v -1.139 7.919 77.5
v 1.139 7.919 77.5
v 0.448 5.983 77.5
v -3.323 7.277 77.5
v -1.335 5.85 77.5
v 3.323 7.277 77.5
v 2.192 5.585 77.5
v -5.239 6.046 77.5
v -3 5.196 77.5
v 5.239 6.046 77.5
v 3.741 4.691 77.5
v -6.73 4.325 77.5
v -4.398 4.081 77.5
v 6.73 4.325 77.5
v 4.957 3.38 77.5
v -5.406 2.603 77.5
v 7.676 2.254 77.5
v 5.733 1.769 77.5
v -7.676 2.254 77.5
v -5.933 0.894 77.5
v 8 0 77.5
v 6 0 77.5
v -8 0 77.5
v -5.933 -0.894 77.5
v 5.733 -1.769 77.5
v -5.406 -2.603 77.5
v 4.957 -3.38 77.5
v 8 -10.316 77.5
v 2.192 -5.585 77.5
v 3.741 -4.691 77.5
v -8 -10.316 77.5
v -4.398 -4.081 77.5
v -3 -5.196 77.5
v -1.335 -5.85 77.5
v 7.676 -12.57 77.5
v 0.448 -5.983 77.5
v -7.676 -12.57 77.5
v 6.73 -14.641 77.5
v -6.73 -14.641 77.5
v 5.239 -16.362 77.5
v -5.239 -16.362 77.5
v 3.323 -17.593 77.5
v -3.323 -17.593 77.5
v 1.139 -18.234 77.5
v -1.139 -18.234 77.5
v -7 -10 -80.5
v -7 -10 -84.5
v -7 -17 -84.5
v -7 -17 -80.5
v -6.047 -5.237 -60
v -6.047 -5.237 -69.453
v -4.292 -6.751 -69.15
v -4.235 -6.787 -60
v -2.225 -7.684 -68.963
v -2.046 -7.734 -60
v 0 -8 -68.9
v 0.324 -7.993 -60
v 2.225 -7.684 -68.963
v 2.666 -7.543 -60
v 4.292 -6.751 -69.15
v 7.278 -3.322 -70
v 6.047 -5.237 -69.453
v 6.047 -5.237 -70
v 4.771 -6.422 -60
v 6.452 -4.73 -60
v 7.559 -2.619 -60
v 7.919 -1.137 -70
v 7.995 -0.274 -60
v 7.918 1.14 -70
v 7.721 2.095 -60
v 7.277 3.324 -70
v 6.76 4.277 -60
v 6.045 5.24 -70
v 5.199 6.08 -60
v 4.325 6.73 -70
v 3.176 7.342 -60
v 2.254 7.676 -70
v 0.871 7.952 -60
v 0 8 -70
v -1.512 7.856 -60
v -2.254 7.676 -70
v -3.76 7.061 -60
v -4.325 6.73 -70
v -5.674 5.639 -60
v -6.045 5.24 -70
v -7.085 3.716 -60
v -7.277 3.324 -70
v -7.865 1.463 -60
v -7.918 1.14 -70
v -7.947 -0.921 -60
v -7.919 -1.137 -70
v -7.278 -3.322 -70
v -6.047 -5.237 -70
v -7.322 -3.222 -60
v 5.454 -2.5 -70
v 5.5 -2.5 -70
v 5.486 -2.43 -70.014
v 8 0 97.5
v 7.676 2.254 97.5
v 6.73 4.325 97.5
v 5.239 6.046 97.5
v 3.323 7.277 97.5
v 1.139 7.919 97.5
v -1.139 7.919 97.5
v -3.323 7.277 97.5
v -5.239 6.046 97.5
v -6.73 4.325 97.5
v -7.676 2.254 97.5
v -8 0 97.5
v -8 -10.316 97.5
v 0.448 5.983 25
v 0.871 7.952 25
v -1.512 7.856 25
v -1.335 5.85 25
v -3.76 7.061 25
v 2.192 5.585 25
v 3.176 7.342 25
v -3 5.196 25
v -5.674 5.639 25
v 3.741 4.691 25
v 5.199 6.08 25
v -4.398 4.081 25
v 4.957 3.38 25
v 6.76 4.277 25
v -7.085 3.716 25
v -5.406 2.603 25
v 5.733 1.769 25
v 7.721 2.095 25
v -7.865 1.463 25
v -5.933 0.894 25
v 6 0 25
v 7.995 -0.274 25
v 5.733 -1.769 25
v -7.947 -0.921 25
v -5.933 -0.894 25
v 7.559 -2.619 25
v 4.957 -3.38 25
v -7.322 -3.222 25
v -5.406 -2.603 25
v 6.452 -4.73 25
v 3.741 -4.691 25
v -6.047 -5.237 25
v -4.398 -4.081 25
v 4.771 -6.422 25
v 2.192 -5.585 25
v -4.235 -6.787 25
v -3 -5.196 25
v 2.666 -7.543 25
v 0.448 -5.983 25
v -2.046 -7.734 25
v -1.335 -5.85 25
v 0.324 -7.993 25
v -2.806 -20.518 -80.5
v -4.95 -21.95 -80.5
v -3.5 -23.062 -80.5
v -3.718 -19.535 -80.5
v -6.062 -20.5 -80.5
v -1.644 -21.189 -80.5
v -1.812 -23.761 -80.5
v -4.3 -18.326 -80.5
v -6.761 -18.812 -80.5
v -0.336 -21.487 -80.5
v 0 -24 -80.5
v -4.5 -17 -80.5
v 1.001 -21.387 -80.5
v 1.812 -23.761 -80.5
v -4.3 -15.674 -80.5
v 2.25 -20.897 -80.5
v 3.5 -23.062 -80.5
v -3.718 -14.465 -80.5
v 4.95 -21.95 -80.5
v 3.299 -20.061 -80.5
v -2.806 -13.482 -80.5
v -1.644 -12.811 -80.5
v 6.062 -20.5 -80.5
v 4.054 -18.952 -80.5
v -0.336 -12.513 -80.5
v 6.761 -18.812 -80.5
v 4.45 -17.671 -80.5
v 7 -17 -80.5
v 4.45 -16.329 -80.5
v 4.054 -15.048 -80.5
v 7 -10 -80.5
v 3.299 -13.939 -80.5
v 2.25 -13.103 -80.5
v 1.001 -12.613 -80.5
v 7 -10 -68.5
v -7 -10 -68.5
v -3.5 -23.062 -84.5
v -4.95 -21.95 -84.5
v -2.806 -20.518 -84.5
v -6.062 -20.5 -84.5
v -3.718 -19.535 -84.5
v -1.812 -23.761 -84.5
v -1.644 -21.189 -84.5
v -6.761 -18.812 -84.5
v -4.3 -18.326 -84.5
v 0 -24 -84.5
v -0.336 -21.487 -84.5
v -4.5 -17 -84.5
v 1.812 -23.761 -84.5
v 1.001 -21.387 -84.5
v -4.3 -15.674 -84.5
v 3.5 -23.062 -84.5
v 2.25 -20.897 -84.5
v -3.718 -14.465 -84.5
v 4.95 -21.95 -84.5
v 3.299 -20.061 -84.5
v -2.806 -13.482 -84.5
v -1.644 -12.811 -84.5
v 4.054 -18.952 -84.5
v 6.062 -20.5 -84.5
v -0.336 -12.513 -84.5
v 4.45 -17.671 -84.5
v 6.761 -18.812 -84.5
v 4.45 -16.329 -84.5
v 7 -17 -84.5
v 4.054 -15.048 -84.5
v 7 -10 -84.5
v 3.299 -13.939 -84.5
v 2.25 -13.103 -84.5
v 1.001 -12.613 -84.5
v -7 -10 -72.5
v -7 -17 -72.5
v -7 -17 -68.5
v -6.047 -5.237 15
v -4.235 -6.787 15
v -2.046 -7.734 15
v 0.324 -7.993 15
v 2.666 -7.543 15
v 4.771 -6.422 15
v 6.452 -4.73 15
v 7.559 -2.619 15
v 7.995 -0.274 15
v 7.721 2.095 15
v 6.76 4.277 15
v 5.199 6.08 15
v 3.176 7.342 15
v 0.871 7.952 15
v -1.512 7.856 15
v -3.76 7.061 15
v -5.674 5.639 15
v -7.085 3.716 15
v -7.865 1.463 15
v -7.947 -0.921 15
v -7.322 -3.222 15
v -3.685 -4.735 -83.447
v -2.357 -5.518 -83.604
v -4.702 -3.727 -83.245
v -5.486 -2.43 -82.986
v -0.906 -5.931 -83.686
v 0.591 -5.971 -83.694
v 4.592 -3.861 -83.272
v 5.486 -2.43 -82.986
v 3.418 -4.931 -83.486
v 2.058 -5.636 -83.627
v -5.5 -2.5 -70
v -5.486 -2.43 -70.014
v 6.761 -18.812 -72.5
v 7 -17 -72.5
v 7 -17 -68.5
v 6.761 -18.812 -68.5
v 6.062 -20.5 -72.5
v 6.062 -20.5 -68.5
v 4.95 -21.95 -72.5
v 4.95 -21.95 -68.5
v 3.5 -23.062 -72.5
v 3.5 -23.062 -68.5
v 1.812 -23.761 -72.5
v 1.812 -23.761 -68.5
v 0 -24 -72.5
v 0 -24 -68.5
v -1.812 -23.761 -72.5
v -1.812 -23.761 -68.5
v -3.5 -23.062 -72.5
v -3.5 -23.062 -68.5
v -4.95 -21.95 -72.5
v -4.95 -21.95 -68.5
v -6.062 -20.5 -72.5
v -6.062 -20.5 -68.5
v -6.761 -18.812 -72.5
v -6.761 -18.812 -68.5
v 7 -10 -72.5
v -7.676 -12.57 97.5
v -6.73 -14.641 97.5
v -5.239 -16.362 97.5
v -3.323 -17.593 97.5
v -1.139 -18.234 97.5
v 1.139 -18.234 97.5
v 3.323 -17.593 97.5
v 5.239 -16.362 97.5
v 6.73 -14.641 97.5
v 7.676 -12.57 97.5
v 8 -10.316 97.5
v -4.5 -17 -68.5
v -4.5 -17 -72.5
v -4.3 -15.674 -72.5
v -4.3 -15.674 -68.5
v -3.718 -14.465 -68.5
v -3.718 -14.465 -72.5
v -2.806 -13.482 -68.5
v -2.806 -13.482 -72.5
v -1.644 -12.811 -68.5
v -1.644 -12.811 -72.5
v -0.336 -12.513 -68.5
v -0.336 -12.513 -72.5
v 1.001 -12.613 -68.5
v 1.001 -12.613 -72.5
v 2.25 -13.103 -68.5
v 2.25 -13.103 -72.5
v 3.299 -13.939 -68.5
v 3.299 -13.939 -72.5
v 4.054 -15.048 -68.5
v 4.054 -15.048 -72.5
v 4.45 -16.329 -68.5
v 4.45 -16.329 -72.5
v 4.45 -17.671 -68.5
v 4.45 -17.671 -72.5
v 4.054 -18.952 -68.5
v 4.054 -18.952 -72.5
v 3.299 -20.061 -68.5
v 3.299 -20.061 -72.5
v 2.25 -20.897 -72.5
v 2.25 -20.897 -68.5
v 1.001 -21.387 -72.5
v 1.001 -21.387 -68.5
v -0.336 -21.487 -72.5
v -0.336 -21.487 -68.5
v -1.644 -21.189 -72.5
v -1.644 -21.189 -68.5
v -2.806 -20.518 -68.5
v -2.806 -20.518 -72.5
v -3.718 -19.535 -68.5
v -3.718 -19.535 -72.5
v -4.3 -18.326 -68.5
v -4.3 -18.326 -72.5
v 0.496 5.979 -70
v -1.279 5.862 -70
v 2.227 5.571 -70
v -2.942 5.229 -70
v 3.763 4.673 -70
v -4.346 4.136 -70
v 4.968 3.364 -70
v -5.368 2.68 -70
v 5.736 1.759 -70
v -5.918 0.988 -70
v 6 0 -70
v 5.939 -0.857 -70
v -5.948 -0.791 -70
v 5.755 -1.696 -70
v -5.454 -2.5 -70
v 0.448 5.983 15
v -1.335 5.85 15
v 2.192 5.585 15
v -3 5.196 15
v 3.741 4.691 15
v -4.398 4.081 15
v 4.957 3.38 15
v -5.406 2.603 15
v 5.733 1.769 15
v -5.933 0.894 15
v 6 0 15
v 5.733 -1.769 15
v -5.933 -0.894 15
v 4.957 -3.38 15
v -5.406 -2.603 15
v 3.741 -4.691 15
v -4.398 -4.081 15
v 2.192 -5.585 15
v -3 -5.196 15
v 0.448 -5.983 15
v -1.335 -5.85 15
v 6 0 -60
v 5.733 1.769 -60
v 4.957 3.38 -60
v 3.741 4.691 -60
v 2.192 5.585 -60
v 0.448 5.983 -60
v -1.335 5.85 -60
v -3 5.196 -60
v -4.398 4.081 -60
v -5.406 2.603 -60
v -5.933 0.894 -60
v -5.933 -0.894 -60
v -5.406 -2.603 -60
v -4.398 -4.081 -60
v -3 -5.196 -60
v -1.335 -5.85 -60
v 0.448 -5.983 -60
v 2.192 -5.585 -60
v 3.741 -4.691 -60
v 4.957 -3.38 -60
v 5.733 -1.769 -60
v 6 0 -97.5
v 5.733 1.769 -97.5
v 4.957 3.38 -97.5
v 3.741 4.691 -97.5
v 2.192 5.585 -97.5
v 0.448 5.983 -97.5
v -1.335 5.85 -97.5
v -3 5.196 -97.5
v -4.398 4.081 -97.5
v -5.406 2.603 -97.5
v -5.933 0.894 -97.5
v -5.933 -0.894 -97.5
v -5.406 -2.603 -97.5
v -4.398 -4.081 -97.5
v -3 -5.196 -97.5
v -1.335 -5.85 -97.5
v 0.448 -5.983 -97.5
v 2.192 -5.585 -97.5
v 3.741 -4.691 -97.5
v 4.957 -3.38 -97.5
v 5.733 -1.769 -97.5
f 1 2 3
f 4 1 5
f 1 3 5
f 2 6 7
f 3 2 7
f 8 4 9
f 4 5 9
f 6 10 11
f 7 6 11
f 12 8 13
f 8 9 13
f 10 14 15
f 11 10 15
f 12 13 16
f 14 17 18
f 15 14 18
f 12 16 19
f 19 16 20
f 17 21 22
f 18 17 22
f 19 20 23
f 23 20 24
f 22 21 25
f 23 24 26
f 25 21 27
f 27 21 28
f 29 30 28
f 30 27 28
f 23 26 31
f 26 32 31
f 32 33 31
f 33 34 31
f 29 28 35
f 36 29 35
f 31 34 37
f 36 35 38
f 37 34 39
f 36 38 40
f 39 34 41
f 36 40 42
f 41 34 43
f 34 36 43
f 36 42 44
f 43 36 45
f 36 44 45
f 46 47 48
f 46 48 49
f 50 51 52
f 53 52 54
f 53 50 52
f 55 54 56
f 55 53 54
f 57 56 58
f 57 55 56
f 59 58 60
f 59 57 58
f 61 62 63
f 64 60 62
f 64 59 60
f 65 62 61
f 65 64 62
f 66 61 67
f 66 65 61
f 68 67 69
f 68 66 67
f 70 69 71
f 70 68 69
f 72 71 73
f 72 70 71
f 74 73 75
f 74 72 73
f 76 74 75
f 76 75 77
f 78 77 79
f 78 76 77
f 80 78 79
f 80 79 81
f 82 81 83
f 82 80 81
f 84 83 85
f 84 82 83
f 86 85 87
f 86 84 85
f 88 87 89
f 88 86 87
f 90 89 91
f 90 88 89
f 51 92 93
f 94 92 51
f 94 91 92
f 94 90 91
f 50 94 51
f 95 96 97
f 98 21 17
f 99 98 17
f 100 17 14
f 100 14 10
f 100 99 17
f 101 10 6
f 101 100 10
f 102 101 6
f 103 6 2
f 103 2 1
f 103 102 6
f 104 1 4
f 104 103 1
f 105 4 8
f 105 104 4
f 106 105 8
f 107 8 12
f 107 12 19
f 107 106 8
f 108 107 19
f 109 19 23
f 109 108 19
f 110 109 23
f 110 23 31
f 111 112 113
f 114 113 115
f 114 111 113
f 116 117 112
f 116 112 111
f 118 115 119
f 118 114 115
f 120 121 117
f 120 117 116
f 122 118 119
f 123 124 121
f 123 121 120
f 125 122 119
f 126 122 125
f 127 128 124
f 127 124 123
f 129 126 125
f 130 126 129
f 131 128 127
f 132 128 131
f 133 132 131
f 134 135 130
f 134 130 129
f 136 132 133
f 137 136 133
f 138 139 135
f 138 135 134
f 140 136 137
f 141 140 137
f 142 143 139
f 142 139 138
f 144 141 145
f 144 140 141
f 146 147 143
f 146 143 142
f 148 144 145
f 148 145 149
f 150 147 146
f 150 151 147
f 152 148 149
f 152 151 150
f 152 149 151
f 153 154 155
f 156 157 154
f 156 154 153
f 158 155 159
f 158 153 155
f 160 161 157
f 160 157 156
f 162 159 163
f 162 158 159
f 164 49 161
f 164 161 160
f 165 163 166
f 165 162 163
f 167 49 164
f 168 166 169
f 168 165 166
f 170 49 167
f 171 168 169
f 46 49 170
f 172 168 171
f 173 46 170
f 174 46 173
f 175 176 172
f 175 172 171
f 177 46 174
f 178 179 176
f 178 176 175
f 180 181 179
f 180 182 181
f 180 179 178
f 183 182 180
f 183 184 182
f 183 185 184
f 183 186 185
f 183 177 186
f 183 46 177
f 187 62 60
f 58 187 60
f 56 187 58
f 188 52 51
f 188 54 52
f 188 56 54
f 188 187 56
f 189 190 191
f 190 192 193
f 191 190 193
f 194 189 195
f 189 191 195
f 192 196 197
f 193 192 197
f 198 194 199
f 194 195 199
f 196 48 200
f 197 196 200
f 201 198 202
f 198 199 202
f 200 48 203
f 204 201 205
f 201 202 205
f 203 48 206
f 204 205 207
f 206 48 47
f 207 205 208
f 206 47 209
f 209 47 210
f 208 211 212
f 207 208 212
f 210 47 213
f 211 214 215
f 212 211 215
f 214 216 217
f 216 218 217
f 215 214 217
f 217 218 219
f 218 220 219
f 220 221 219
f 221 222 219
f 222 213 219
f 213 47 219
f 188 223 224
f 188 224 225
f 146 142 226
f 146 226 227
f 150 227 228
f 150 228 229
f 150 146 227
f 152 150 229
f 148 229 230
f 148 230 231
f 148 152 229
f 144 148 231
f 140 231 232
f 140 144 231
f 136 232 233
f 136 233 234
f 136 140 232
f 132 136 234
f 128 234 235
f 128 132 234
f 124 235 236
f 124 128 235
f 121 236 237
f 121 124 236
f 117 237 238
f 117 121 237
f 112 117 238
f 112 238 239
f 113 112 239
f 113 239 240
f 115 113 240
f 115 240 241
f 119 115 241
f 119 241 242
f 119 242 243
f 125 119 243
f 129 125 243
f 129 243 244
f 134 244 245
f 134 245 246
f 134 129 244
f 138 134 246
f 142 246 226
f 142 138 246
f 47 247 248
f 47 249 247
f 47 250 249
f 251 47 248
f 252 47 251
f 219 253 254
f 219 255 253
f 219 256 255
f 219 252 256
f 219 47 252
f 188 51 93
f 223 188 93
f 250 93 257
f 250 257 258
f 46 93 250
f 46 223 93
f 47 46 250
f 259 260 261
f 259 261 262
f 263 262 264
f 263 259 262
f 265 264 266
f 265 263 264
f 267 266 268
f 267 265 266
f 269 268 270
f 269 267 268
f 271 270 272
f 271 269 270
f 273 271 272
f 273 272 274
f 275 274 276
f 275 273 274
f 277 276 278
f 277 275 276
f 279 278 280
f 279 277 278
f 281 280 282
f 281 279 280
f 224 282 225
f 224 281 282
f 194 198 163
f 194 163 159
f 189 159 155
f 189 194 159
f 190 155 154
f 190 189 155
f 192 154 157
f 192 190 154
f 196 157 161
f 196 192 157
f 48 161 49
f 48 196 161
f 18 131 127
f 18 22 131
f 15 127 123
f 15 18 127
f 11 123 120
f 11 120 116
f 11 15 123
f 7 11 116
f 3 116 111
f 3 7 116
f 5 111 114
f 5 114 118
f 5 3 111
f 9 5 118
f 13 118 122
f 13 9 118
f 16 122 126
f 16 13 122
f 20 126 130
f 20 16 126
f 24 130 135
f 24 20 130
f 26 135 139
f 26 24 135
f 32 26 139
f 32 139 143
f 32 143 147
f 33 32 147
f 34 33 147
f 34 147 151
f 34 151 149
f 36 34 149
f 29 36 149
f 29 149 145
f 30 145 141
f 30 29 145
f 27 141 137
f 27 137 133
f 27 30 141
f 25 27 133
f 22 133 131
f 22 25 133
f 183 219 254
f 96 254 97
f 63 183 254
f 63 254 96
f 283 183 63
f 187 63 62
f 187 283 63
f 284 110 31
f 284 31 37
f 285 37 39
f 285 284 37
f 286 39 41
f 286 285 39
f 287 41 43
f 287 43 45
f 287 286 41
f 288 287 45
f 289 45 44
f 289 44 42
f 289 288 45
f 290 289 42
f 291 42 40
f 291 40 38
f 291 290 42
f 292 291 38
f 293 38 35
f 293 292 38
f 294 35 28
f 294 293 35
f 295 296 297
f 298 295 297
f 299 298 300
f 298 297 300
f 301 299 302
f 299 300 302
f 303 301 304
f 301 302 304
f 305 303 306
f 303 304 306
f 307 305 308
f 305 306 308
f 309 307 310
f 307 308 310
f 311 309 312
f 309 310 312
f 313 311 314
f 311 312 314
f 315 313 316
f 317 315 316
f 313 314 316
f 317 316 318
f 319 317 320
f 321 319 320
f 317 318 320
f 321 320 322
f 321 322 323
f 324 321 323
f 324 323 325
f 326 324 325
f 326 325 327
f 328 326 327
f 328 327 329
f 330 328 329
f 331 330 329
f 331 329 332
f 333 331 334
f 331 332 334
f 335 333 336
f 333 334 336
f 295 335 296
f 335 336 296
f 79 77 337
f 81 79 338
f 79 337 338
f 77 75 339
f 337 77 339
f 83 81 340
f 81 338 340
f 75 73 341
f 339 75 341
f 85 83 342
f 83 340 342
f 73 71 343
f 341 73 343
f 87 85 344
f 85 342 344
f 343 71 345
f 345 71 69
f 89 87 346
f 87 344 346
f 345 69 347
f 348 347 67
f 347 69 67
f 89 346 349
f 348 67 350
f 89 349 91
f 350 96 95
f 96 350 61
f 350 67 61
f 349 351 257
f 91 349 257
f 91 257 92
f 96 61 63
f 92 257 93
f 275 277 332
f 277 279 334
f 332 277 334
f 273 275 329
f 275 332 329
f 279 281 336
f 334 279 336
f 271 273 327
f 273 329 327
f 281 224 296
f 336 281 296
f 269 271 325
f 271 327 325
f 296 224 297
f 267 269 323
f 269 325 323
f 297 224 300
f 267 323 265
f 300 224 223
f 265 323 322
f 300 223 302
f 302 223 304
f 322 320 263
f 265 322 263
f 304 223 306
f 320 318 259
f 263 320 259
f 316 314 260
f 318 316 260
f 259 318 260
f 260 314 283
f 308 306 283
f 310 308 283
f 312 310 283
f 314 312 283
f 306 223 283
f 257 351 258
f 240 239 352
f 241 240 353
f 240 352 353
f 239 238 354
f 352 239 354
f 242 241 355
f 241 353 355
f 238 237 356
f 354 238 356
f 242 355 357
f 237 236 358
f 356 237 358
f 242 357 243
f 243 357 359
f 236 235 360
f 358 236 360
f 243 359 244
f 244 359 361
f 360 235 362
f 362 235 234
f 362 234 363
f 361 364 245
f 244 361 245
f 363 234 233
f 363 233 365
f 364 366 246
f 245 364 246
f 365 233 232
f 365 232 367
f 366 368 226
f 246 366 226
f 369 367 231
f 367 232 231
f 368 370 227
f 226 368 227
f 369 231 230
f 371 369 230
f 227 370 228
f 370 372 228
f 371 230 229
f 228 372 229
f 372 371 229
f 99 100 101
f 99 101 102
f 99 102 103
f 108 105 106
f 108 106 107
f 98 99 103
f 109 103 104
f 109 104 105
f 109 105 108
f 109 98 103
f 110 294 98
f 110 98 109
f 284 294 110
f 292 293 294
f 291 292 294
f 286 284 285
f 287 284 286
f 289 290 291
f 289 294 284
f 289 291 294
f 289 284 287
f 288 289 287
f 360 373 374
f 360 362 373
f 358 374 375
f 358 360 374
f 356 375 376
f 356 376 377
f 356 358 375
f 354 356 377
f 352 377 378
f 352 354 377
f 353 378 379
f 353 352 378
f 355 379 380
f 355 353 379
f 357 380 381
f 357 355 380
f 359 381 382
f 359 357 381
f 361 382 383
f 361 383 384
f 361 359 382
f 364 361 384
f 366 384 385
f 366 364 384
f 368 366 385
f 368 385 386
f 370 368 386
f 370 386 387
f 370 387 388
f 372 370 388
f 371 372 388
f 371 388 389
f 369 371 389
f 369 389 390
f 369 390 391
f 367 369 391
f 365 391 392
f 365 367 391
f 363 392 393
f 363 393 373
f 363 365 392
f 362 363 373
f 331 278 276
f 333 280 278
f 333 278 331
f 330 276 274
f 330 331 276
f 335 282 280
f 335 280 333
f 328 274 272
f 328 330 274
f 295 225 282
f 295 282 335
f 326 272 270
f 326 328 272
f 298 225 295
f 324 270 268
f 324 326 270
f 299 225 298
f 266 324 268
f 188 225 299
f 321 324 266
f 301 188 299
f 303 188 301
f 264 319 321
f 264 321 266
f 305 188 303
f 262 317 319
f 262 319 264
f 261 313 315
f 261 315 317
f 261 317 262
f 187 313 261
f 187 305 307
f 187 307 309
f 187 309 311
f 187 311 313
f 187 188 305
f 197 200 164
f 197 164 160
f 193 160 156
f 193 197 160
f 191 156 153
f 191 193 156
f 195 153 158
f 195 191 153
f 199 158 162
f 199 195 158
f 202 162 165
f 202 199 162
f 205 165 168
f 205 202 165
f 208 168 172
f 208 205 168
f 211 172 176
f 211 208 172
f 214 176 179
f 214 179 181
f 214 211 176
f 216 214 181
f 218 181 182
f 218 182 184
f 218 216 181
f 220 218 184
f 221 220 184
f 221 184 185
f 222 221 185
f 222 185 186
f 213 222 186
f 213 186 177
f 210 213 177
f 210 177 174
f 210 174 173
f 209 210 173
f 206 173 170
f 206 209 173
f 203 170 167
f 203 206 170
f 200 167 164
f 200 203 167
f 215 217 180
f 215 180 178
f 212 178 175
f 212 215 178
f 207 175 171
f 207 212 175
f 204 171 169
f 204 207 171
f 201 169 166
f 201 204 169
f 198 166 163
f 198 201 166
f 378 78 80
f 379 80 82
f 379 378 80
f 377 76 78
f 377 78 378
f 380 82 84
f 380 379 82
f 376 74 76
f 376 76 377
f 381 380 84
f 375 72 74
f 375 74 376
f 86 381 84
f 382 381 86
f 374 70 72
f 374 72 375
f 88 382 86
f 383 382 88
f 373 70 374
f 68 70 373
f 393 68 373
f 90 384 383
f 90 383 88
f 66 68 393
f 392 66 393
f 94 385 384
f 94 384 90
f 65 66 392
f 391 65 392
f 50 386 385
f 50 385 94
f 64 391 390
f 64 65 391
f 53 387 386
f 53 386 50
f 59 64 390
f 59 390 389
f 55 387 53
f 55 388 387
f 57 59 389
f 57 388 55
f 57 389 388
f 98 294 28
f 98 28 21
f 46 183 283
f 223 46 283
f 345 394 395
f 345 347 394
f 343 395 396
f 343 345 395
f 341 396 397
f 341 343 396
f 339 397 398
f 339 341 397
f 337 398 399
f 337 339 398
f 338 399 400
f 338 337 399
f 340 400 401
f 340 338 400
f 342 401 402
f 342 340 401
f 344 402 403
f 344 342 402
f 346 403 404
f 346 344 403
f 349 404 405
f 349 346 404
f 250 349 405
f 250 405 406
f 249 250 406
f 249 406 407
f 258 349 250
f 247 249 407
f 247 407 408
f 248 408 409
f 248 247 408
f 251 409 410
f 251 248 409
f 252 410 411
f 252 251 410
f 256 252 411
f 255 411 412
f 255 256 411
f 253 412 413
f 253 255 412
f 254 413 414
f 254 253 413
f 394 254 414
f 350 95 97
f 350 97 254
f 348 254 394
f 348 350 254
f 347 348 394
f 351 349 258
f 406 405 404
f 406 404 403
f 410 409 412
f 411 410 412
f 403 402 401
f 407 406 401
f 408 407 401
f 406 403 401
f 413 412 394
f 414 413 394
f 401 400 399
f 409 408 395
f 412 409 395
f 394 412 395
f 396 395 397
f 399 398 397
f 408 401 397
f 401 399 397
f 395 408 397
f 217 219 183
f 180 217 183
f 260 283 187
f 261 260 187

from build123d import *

# Parameters (mm, degrees)
SKETCH1_R           = 6
BOSS_EXTRUDE1_DEPTH = 97.5
SKETCH4_W           = 14
SKETCH4_H           = 4
BOSS_EXTRUDE2_DEPTH = 14
SKETCH5_R           = 4.5
CUT_EXTRUDE1_DEPTH  = 4
CUT_EXTRUDE2_START  = -4
SKETCH6_R           = 4.5
CUT_EXTRUDE2_DEPTH  = 4
CUT_EXTRUDE3_DEPTH  = 168.871975132
SKETCH8_R           = 8
BOSS_EXTRUDE3_DEPTH = 5
SKETCH9_R           = 6
BOSS_EXTRUDE4_DEPTH = 20
BOSS_EXTRUDE5_START = 10
SKETCH11_R          = 8
BOSS_EXTRUDE5_DEPTH = 10


with BuildPart() as part:
    # Sketch1 → Boss-Extrude1 (new, symmetric)
    with BuildSketch(Plane.XY):
        Circle(SKETCH1_R)
    extrude(amount=BOSS_EXTRUDE1_DEPTH, both=True)

    # Sketch2 → Loft1 section 0
    with BuildSketch(Plane(origin=(0, 0, 0), x_dir=(1, 0, 0), z_dir=(0, 1, 0))):
        with BuildLine():
            Line((-5, 82.5), (5, 82.5))
            Line((5, 82.5), (5, 70.5))
            Line((5, 70.5), (-5, 70.5))
            Line((-5, 70.5), (-5, 82.5))
        make_face()
    # Sketch3 → Loft1 section 1
    with BuildSketch(Plane(origin=(0, -10, 0), x_dir=(-1, 0, 0), z_dir=(0, 1, 0))):
        with BuildLine():
            Line((-7, -68.5), (7, -68.5))
            Line((7, -68.5), (7, -84.5))
            Line((7, -84.5), (-7, -84.5))
            Line((-7, -84.5), (-7, -68.5))
        make_face()
    loft()

    # Sketch4 → Boss-Extrude2 (add)
    with BuildSketch(Plane.XZ.offset(10)):
        with Locations((0, -70.5)):
            Rectangle(SKETCH4_W, SKETCH4_H)
        with Locations((0, -82.5)):
            Rectangle(SKETCH4_W, SKETCH4_H)
    extrude(amount=BOSS_EXTRUDE2_DEPTH)

    # Sketch5 → Cut-Extrude1 (cut)
    with BuildSketch(Plane(origin=(0, 0, -72.5), x_dir=(-1, 0, 0), z_dir=(0, 0, -1))):
        with Locations((0, -17)):
            Circle(SKETCH5_R)
    extrude(amount=-CUT_EXTRUDE1_DEPTH, mode=Mode.SUBTRACT)

    # Sketch6 → Cut-Extrude2 (cut)
    with BuildSketch(Plane.XY.offset(-80.5).offset(CUT_EXTRUDE2_START)):
        with Locations((0, -17)):
            Circle(SKETCH6_R)
    extrude(amount=CUT_EXTRUDE2_DEPTH, mode=Mode.SUBTRACT)

    # Sketch7 → Cut-Extrude3 (cut, through all)
    with BuildSketch(Plane.XY.offset(-68.5)):
        with BuildLine():
            ThreePointArc((0, -24), (-4.949747468, -21.949747468), (-7, -17))
            Line((-7, -17), (-7, -24))
            Line((-7, -24), (0, -24))
        make_face()
        with BuildLine():
            ThreePointArc((7, -17), (4.949747468, -21.949747468), (0, -24))
            Line((0, -24), (7, -24))
            Line((7, -24), (7, -17))
        make_face()
    extrude(amount=-CUT_EXTRUDE3_DEPTH, mode=Mode.SUBTRACT)

    # Sketch8 → Boss-Extrude3 (add, symmetric)
    with BuildSketch(Plane.XY.offset(-65)):
        Circle(SKETCH8_R)
    extrude(amount=BOSS_EXTRUDE3_DEPTH, both=True)

    # Sketch9 → Boss-Extrude4 (add)
    with BuildSketch(Plane.XY.offset(97.5)):
        with BuildLine():
            Line((8, -10.315788333), (8, 0))
            ThreePointArc((8, 0), (0, 8), (-8, 0))
            Line((-8, 0), (-8, -10.315788333))
            ThreePointArc((-8, -10.315788333), (0, -18.315788333), (8, -10.315788333))
        make_face()
        Circle(SKETCH9_R, mode=Mode.SUBTRACT)
    extrude(amount=-BOSS_EXTRUDE4_DEPTH)

    # Sketch11 → Boss-Extrude5 (add)
    with BuildSketch(Plane.XY.offset(15).offset(BOSS_EXTRUDE5_START)):
        Circle(SKETCH11_R)
    extrude(amount=-BOSS_EXTRUDE5_DEPTH)


solid = part.part
